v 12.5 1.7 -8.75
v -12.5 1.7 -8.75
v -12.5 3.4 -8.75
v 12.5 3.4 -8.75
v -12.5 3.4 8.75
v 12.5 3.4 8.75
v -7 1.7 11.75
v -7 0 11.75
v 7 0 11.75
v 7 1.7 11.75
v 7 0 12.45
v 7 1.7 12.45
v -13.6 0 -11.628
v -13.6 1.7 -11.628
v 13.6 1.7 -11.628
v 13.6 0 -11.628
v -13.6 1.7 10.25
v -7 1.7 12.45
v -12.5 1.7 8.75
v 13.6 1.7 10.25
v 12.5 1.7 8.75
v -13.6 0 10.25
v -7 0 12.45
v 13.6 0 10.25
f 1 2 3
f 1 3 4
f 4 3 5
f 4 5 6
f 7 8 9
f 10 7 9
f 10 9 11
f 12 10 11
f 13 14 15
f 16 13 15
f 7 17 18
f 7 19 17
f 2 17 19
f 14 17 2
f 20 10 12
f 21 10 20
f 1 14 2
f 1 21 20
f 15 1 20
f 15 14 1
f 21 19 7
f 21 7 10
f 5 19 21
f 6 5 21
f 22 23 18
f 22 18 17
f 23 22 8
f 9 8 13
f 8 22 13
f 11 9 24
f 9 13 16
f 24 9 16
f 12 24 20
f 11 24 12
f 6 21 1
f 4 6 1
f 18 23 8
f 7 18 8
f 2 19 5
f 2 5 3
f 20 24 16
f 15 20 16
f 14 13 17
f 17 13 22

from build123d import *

# Parameters (mm, degrees)
BOSS_EXTRUDE1_DEPTH = 1.7
SKETCH2_W           = 25
SKETCH2_H           = 17.5
BOSS_EXTRUDE2_DEPTH = 1.7
CHAMFER1_SIZE       = 12
CHAMFER1_SIZE_2     = 4
CHAMFER2_SIZE       = 4
CHAMFER2_SIZE_2     = 12
SKETCH3_W           = 27.2
SKETCH3_H           = 2.622019417
CUT_EXTRUDE1_DEPTH  = 20.771507277


with BuildPart() as part:
    # Sketch1 → Boss-Extrude1 (new body)
    with BuildSketch(Plane(origin=(0, 0, 0), x_dir=(1, 0, 0), z_dir=(0, 1, 0))):
        Polygon((-13.6, -14.25), (-7, -14.25), (-7, -11.75), (7, -11.75), (7, -14.25), (13.6, -14.25), (13.6, 14.25), (-13.6, 14.25), align=None)
    extrude(amount=BOSS_EXTRUDE1_DEPTH)

    # Sketch2 → Boss-Extrude2 (add)
    with BuildSketch(Plane(origin=(0, 1.7, 0), x_dir=(1, 0, 0), z_dir=(0, 1, 0))):
        Rectangle(SKETCH2_W, SKETCH2_H)
    extrude(amount=BOSS_EXTRUDE2_DEPTH)

    # Chamfer1
    # the kernel refuses this chamfer: 12, 4 mm, written as the material it takes off along each edge
    with BuildSketch(Plane(origin=(-13.6, -31.140732128, 14.25), x_dir=(0.9999257509361694, 0, 0.012185754582199854), z_dir=(0, 1, 0))) as chamfer1_piece_1:
        Polygon((CHAMFER1_SIZE * 0.999925750936, CHAMFER1_SIZE * 0.0121857545822), (-CHAMFER1_SIZE_2 * 0.0121857545822, CHAMFER1_SIZE_2 * 0.999925750936), (0, 0), align=None)
    extrude(amount=63.981464256, mode=Mode.SUBTRACT)

    # Chamfer2
    # the kernel refuses this chamfer: 12, 4 mm, written as the material it takes off along each edge
    with BuildSketch(Plane(origin=(13.6, -31.140732128, 14.25), x_dir=(0.10902612017980688, 0, -0.9940388851139268), z_dir=(0, 1, 0))) as chamfer2_piece_1:
        Polygon((CHAMFER2_SIZE * 0.994038885114, CHAMFER2_SIZE * 0.10902612018), (-CHAMFER2_SIZE_2 * 0.10902612018, CHAMFER2_SIZE_2 * 0.994038885114), (0, 0), align=None)
    extrude(amount=63.981464256, mode=Mode.SUBTRACT)

    # Sketch3 → Cut-Extrude1 (cut, through all)
    with BuildSketch(Plane(origin=(0, 1.7, 0), x_dir=(1, 0, 0), z_dir=(0, 1, 0))):
        with Locations((0, 12.938990292)):
            Rectangle(SKETCH3_W, SKETCH3_H)
    extrude(amount=-CUT_EXTRUDE1_DEPTH, mode=Mode.SUBTRACT)


solid = part.part
